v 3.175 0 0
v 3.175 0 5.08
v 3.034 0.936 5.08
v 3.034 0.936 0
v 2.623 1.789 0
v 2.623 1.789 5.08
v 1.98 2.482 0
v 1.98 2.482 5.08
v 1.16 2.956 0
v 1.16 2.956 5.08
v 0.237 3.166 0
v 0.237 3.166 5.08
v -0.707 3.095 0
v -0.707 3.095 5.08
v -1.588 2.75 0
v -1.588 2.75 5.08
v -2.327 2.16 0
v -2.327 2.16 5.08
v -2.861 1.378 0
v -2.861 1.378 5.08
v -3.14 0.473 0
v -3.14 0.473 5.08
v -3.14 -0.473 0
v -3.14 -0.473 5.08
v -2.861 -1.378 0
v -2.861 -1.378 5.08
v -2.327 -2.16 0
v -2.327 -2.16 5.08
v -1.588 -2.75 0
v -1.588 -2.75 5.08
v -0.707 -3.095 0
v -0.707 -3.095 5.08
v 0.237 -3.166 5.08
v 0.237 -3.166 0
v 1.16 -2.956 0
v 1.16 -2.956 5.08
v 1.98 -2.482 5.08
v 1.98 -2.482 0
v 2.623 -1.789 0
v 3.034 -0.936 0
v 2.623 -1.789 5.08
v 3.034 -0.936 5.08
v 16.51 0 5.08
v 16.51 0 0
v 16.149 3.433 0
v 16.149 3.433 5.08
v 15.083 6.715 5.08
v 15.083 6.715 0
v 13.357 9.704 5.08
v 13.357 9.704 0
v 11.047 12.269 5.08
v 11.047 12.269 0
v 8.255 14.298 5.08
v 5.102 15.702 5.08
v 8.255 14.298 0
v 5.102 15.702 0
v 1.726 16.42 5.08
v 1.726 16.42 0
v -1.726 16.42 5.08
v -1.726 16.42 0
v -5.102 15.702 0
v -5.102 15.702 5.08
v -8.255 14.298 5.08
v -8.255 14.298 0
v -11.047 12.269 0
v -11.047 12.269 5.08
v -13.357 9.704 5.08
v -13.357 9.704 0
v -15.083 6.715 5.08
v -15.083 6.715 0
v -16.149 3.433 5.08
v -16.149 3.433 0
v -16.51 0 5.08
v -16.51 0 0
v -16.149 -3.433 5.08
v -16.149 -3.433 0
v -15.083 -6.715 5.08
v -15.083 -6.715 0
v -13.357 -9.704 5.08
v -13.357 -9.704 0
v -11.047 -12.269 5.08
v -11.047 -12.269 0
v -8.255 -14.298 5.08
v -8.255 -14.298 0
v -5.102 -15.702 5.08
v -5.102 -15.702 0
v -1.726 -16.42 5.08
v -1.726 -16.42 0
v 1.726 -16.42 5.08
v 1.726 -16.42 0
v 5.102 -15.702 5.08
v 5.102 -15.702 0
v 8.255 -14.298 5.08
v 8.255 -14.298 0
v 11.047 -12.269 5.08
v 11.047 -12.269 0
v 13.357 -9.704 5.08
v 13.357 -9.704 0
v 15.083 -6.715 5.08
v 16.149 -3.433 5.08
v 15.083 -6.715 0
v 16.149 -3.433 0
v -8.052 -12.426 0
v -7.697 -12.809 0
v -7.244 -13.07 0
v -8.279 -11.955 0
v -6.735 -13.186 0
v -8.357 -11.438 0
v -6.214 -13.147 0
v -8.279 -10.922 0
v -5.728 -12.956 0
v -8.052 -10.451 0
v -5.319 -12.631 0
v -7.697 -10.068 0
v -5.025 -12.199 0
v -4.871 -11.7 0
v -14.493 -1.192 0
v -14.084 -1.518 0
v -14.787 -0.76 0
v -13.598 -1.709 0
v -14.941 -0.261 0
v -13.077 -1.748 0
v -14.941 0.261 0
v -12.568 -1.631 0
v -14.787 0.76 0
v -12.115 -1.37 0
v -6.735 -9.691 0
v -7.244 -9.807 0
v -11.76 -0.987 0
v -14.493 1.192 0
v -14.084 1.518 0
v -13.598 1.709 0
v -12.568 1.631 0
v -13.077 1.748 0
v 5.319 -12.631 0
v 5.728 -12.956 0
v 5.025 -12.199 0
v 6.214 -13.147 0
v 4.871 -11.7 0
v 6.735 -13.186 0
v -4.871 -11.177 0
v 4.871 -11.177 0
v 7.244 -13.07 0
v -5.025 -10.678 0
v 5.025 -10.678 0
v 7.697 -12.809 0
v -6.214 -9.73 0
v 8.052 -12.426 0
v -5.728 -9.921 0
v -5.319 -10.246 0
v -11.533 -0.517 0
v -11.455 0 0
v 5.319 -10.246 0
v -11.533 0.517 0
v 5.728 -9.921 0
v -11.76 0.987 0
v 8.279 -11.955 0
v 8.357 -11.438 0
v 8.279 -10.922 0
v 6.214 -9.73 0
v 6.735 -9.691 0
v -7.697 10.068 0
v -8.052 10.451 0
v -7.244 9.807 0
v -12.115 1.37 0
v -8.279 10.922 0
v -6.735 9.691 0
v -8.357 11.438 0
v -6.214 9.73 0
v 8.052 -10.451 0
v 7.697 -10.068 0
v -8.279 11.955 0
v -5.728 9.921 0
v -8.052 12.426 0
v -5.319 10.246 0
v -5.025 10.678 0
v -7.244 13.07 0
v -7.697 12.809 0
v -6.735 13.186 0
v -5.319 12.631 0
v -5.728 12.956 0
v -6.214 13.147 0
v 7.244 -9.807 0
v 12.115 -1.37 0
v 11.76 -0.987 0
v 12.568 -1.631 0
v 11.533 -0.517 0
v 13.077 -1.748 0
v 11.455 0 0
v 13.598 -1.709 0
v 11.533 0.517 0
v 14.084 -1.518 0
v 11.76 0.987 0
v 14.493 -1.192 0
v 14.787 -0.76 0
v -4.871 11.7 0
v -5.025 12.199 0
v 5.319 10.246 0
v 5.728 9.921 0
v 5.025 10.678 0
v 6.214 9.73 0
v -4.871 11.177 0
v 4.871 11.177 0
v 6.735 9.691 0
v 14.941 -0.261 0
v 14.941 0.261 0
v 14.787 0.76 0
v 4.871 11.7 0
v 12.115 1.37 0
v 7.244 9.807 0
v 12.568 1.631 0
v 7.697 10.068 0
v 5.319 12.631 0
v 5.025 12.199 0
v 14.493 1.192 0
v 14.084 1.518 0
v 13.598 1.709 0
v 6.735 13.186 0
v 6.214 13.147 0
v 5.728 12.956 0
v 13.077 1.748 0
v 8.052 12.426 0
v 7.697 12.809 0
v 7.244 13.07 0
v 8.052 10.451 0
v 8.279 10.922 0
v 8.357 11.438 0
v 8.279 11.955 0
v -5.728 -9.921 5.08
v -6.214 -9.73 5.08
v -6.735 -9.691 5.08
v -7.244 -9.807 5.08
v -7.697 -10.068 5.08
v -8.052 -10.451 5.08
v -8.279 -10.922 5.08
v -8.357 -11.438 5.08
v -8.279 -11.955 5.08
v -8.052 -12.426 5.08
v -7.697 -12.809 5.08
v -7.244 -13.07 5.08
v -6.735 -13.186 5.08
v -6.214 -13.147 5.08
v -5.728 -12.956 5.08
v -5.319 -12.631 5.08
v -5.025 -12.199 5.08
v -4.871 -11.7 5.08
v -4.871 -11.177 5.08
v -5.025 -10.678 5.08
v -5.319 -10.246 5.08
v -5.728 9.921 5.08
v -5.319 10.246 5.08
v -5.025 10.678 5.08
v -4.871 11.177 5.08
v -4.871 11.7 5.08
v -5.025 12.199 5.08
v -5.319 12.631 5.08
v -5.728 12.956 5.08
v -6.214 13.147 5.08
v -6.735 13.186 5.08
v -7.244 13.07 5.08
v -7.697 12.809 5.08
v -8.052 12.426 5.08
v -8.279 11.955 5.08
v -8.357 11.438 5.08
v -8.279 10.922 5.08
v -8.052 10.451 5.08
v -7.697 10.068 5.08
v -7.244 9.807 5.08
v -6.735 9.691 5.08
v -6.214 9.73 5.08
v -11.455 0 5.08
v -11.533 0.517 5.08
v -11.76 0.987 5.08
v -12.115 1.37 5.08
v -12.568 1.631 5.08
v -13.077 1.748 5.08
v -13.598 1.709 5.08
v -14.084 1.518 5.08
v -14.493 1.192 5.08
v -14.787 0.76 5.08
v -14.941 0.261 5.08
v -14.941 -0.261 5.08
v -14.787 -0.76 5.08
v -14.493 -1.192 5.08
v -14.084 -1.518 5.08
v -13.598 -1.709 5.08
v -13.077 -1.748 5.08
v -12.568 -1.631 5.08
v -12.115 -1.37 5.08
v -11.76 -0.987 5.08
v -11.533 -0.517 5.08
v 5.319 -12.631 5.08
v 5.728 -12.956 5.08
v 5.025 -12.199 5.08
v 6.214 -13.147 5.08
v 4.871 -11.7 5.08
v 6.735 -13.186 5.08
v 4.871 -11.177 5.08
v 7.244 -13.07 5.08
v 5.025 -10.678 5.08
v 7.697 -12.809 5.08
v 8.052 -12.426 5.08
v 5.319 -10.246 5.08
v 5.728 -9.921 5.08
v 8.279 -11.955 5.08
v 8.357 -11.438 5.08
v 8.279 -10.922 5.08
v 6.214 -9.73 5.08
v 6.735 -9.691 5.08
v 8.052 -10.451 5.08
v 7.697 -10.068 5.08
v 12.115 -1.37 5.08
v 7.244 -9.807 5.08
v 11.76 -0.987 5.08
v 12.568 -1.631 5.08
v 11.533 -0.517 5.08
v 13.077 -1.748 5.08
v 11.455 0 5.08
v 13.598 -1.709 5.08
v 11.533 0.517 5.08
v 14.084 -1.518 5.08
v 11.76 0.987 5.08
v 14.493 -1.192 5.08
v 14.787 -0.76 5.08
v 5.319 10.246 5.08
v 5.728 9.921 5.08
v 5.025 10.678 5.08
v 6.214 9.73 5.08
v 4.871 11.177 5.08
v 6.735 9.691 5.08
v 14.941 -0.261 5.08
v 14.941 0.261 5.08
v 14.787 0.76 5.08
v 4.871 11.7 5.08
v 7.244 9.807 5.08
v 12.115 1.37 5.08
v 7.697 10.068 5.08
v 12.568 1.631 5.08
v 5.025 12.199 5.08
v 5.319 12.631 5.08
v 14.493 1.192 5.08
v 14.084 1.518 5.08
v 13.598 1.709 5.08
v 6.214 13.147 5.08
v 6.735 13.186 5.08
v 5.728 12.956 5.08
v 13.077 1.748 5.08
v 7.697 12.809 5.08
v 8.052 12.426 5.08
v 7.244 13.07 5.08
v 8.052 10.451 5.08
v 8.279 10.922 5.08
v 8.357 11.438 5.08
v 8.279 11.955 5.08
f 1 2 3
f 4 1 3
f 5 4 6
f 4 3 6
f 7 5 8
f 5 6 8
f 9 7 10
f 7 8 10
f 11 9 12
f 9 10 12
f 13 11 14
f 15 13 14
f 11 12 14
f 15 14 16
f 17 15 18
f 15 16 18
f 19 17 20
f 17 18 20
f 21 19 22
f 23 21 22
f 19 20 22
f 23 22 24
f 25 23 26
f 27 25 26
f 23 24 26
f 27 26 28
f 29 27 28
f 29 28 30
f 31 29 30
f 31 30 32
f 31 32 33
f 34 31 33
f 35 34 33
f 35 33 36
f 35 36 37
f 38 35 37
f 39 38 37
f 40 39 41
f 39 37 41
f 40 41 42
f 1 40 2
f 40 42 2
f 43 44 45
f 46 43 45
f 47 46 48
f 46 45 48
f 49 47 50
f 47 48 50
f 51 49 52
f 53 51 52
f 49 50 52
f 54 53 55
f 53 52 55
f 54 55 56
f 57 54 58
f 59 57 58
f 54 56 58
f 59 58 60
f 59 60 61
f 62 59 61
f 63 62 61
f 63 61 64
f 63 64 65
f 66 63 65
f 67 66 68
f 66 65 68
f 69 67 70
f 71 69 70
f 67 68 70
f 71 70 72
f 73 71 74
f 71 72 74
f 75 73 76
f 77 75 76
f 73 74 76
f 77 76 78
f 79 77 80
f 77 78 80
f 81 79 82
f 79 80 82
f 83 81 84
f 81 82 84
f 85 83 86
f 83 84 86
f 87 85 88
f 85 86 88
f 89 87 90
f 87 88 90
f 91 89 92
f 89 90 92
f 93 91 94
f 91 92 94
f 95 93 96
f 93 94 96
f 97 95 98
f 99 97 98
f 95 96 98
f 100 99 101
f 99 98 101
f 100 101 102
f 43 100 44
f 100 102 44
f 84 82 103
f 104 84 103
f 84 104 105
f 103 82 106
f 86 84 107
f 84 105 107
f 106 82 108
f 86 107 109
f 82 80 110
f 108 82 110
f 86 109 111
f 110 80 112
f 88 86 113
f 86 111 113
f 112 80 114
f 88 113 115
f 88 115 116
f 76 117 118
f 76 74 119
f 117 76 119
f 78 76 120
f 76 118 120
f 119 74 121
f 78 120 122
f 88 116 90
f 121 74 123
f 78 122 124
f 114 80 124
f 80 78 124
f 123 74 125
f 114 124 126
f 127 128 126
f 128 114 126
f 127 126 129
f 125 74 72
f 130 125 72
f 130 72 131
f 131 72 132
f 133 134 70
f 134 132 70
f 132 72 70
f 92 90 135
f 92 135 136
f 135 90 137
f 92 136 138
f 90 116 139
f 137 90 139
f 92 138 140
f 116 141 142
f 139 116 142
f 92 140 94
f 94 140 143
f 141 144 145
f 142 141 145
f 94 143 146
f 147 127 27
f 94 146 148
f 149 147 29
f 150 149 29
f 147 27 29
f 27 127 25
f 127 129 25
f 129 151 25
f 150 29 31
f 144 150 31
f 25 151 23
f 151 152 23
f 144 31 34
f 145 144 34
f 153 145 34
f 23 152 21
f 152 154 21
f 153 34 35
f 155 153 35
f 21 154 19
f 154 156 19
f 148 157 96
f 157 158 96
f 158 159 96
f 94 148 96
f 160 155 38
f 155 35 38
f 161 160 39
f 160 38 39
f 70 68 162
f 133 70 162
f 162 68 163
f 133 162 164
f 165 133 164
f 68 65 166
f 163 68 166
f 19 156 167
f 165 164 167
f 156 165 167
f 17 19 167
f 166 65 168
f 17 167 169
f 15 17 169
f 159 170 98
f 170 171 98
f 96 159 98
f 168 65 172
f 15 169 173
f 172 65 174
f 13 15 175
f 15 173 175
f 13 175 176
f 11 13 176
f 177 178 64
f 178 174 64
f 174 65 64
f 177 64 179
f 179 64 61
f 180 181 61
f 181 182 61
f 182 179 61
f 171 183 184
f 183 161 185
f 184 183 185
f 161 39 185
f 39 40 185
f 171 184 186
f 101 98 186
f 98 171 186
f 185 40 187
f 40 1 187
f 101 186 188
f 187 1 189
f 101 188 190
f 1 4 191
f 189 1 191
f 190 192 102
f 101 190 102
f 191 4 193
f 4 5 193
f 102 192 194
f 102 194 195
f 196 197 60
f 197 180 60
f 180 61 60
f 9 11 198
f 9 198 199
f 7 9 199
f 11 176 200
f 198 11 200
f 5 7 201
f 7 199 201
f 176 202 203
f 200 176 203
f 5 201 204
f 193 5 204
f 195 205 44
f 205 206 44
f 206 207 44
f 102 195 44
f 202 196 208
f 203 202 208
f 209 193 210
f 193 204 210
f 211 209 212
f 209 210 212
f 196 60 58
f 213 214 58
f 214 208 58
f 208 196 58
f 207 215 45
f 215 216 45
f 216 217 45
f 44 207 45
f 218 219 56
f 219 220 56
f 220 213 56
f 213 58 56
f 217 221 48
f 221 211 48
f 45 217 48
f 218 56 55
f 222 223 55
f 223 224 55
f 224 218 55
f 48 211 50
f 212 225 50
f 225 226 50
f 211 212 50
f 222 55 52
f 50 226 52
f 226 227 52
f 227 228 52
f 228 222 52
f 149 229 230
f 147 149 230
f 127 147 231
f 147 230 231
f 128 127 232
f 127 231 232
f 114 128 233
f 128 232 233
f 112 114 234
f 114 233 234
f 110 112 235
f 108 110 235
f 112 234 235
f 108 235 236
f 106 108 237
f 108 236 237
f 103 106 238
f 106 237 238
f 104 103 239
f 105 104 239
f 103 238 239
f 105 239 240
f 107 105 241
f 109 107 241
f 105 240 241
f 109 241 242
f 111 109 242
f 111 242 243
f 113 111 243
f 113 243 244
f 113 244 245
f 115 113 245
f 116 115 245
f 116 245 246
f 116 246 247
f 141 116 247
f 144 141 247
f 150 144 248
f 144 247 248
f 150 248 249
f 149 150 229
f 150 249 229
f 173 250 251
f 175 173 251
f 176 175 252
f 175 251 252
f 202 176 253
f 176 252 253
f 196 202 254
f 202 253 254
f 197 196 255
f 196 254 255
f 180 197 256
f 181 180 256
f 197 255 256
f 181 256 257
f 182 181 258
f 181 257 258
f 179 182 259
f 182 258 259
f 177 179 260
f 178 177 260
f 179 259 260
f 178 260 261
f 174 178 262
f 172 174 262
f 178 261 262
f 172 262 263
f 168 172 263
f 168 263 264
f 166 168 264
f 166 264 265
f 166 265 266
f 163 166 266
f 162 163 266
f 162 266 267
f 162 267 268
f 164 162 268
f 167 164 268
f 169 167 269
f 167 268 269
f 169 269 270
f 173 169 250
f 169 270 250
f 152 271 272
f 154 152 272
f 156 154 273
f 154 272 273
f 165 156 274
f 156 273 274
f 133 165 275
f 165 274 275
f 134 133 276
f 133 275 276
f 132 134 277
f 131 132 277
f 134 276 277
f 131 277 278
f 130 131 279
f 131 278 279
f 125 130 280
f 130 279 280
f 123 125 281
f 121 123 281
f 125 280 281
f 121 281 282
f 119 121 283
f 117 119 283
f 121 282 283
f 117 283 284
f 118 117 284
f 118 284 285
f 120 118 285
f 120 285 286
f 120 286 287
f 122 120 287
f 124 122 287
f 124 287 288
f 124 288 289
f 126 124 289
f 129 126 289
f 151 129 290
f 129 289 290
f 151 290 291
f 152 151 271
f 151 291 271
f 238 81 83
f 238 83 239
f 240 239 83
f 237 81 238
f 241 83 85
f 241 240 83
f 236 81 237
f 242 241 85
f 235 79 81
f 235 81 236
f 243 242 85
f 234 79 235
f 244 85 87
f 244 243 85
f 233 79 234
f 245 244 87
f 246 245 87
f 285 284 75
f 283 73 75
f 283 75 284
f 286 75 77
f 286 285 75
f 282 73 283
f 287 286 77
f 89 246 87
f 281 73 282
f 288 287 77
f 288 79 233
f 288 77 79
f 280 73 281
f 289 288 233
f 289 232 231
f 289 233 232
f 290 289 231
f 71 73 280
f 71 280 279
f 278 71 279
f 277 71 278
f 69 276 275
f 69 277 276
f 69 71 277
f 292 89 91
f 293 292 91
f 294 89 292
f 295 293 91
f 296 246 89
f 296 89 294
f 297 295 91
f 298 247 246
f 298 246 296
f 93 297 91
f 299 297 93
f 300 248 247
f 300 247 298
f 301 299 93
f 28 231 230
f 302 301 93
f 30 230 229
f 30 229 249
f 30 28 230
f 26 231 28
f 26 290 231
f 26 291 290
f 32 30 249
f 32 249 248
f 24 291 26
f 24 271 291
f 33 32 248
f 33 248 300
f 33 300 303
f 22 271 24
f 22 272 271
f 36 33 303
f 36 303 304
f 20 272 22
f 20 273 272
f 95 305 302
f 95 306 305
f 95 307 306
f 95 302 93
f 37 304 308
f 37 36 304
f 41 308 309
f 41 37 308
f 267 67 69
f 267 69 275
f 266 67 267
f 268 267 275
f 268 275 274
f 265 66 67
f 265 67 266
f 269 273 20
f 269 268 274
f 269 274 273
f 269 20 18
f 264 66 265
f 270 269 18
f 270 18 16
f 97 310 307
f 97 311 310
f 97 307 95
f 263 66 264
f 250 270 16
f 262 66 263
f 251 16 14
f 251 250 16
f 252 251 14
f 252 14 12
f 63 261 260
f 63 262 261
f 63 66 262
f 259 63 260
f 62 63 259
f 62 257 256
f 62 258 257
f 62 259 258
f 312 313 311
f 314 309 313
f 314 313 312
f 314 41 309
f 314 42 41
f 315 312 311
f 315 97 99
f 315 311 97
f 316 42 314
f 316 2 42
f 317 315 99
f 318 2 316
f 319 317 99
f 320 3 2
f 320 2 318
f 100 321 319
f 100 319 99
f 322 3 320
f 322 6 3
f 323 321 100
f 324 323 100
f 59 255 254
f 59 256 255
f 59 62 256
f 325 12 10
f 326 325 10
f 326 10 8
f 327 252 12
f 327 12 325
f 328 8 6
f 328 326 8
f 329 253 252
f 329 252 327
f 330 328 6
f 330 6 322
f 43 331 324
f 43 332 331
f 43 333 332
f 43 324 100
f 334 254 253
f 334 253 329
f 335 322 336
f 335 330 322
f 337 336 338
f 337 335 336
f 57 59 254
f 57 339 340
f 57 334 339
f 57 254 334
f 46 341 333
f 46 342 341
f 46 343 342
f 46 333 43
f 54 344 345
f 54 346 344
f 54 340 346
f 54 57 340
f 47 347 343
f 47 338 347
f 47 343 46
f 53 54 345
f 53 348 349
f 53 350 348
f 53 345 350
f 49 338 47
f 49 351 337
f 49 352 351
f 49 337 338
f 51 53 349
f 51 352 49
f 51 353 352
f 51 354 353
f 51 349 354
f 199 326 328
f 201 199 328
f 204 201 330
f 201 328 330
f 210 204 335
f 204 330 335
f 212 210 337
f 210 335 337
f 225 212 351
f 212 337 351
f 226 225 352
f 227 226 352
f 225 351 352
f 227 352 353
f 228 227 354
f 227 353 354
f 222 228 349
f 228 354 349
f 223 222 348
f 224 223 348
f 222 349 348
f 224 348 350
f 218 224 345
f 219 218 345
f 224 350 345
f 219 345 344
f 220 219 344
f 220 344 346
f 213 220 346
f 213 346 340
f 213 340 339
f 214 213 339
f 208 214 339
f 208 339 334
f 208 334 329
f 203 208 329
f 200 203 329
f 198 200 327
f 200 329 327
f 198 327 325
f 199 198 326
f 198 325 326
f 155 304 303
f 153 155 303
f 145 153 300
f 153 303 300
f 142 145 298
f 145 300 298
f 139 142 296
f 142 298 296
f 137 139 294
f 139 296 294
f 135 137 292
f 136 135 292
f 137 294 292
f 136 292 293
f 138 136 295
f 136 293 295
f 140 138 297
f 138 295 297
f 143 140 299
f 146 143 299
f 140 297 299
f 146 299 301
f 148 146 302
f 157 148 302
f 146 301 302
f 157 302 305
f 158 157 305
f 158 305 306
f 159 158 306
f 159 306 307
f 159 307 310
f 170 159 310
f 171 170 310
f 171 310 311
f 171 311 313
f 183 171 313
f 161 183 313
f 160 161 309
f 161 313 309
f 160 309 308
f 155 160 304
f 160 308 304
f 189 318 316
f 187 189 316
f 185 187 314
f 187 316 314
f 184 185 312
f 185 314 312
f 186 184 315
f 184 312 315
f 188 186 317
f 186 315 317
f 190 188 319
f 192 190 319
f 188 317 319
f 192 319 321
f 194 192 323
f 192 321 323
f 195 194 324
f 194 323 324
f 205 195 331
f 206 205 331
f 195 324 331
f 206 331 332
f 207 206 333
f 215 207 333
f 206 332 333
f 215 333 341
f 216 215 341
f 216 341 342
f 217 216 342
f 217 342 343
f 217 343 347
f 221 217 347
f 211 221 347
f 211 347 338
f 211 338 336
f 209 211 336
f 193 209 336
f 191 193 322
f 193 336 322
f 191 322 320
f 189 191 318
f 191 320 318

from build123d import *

# Parameters (mm, degrees)
SKETCH1_R           = 16.51
BOSS_EXTRUDE1_DEPTH = 5.08
SKETCH2_R           = 3.175
CUT_EXTRUDE1_DEPTH  = 5.08
SKETCH3_R           = 1.7526
CUT_EXTRUDE2_DEPTH  = 5.08
CIRPATTERN1_COUNT   = 6


with BuildPart() as part:
    # Sketch1 → Boss-Extrude1 (new body)
    with BuildSketch(Plane.XY):
        Circle(SKETCH1_R)
    extrude(amount=BOSS_EXTRUDE1_DEPTH)

    # Sketch2 → Cut-Extrude1 (cut)
    with BuildSketch(Plane.XY.offset(5.08)):
        Circle(SKETCH2_R)
    extrude(amount=-CUT_EXTRUDE1_DEPTH, mode=Mode.SUBTRACT)

    # Sketch3 → Cut-Extrude2 (cut)
    with BuildSketch(Plane.XY.offset(5.08)):
        with Locations((-13.208, 0)):
            Circle(SKETCH3_R)
    cut_extrude2 = extrude(amount=-CUT_EXTRUDE2_DEPTH, mode=Mode.SUBTRACT)

    # CirPattern1: Cut-Extrude2 ×6 about axis
    cirpattern1_axis = Axis((0, 0, 0), (0, 0, 1))
    for i in range(1, CIRPATTERN1_COUNT):
        add(cut_extrude2.rotate(cirpattern1_axis, i * 360 / CIRPATTERN1_COUNT), mode=Mode.SUBTRACT)


solid = part.part
